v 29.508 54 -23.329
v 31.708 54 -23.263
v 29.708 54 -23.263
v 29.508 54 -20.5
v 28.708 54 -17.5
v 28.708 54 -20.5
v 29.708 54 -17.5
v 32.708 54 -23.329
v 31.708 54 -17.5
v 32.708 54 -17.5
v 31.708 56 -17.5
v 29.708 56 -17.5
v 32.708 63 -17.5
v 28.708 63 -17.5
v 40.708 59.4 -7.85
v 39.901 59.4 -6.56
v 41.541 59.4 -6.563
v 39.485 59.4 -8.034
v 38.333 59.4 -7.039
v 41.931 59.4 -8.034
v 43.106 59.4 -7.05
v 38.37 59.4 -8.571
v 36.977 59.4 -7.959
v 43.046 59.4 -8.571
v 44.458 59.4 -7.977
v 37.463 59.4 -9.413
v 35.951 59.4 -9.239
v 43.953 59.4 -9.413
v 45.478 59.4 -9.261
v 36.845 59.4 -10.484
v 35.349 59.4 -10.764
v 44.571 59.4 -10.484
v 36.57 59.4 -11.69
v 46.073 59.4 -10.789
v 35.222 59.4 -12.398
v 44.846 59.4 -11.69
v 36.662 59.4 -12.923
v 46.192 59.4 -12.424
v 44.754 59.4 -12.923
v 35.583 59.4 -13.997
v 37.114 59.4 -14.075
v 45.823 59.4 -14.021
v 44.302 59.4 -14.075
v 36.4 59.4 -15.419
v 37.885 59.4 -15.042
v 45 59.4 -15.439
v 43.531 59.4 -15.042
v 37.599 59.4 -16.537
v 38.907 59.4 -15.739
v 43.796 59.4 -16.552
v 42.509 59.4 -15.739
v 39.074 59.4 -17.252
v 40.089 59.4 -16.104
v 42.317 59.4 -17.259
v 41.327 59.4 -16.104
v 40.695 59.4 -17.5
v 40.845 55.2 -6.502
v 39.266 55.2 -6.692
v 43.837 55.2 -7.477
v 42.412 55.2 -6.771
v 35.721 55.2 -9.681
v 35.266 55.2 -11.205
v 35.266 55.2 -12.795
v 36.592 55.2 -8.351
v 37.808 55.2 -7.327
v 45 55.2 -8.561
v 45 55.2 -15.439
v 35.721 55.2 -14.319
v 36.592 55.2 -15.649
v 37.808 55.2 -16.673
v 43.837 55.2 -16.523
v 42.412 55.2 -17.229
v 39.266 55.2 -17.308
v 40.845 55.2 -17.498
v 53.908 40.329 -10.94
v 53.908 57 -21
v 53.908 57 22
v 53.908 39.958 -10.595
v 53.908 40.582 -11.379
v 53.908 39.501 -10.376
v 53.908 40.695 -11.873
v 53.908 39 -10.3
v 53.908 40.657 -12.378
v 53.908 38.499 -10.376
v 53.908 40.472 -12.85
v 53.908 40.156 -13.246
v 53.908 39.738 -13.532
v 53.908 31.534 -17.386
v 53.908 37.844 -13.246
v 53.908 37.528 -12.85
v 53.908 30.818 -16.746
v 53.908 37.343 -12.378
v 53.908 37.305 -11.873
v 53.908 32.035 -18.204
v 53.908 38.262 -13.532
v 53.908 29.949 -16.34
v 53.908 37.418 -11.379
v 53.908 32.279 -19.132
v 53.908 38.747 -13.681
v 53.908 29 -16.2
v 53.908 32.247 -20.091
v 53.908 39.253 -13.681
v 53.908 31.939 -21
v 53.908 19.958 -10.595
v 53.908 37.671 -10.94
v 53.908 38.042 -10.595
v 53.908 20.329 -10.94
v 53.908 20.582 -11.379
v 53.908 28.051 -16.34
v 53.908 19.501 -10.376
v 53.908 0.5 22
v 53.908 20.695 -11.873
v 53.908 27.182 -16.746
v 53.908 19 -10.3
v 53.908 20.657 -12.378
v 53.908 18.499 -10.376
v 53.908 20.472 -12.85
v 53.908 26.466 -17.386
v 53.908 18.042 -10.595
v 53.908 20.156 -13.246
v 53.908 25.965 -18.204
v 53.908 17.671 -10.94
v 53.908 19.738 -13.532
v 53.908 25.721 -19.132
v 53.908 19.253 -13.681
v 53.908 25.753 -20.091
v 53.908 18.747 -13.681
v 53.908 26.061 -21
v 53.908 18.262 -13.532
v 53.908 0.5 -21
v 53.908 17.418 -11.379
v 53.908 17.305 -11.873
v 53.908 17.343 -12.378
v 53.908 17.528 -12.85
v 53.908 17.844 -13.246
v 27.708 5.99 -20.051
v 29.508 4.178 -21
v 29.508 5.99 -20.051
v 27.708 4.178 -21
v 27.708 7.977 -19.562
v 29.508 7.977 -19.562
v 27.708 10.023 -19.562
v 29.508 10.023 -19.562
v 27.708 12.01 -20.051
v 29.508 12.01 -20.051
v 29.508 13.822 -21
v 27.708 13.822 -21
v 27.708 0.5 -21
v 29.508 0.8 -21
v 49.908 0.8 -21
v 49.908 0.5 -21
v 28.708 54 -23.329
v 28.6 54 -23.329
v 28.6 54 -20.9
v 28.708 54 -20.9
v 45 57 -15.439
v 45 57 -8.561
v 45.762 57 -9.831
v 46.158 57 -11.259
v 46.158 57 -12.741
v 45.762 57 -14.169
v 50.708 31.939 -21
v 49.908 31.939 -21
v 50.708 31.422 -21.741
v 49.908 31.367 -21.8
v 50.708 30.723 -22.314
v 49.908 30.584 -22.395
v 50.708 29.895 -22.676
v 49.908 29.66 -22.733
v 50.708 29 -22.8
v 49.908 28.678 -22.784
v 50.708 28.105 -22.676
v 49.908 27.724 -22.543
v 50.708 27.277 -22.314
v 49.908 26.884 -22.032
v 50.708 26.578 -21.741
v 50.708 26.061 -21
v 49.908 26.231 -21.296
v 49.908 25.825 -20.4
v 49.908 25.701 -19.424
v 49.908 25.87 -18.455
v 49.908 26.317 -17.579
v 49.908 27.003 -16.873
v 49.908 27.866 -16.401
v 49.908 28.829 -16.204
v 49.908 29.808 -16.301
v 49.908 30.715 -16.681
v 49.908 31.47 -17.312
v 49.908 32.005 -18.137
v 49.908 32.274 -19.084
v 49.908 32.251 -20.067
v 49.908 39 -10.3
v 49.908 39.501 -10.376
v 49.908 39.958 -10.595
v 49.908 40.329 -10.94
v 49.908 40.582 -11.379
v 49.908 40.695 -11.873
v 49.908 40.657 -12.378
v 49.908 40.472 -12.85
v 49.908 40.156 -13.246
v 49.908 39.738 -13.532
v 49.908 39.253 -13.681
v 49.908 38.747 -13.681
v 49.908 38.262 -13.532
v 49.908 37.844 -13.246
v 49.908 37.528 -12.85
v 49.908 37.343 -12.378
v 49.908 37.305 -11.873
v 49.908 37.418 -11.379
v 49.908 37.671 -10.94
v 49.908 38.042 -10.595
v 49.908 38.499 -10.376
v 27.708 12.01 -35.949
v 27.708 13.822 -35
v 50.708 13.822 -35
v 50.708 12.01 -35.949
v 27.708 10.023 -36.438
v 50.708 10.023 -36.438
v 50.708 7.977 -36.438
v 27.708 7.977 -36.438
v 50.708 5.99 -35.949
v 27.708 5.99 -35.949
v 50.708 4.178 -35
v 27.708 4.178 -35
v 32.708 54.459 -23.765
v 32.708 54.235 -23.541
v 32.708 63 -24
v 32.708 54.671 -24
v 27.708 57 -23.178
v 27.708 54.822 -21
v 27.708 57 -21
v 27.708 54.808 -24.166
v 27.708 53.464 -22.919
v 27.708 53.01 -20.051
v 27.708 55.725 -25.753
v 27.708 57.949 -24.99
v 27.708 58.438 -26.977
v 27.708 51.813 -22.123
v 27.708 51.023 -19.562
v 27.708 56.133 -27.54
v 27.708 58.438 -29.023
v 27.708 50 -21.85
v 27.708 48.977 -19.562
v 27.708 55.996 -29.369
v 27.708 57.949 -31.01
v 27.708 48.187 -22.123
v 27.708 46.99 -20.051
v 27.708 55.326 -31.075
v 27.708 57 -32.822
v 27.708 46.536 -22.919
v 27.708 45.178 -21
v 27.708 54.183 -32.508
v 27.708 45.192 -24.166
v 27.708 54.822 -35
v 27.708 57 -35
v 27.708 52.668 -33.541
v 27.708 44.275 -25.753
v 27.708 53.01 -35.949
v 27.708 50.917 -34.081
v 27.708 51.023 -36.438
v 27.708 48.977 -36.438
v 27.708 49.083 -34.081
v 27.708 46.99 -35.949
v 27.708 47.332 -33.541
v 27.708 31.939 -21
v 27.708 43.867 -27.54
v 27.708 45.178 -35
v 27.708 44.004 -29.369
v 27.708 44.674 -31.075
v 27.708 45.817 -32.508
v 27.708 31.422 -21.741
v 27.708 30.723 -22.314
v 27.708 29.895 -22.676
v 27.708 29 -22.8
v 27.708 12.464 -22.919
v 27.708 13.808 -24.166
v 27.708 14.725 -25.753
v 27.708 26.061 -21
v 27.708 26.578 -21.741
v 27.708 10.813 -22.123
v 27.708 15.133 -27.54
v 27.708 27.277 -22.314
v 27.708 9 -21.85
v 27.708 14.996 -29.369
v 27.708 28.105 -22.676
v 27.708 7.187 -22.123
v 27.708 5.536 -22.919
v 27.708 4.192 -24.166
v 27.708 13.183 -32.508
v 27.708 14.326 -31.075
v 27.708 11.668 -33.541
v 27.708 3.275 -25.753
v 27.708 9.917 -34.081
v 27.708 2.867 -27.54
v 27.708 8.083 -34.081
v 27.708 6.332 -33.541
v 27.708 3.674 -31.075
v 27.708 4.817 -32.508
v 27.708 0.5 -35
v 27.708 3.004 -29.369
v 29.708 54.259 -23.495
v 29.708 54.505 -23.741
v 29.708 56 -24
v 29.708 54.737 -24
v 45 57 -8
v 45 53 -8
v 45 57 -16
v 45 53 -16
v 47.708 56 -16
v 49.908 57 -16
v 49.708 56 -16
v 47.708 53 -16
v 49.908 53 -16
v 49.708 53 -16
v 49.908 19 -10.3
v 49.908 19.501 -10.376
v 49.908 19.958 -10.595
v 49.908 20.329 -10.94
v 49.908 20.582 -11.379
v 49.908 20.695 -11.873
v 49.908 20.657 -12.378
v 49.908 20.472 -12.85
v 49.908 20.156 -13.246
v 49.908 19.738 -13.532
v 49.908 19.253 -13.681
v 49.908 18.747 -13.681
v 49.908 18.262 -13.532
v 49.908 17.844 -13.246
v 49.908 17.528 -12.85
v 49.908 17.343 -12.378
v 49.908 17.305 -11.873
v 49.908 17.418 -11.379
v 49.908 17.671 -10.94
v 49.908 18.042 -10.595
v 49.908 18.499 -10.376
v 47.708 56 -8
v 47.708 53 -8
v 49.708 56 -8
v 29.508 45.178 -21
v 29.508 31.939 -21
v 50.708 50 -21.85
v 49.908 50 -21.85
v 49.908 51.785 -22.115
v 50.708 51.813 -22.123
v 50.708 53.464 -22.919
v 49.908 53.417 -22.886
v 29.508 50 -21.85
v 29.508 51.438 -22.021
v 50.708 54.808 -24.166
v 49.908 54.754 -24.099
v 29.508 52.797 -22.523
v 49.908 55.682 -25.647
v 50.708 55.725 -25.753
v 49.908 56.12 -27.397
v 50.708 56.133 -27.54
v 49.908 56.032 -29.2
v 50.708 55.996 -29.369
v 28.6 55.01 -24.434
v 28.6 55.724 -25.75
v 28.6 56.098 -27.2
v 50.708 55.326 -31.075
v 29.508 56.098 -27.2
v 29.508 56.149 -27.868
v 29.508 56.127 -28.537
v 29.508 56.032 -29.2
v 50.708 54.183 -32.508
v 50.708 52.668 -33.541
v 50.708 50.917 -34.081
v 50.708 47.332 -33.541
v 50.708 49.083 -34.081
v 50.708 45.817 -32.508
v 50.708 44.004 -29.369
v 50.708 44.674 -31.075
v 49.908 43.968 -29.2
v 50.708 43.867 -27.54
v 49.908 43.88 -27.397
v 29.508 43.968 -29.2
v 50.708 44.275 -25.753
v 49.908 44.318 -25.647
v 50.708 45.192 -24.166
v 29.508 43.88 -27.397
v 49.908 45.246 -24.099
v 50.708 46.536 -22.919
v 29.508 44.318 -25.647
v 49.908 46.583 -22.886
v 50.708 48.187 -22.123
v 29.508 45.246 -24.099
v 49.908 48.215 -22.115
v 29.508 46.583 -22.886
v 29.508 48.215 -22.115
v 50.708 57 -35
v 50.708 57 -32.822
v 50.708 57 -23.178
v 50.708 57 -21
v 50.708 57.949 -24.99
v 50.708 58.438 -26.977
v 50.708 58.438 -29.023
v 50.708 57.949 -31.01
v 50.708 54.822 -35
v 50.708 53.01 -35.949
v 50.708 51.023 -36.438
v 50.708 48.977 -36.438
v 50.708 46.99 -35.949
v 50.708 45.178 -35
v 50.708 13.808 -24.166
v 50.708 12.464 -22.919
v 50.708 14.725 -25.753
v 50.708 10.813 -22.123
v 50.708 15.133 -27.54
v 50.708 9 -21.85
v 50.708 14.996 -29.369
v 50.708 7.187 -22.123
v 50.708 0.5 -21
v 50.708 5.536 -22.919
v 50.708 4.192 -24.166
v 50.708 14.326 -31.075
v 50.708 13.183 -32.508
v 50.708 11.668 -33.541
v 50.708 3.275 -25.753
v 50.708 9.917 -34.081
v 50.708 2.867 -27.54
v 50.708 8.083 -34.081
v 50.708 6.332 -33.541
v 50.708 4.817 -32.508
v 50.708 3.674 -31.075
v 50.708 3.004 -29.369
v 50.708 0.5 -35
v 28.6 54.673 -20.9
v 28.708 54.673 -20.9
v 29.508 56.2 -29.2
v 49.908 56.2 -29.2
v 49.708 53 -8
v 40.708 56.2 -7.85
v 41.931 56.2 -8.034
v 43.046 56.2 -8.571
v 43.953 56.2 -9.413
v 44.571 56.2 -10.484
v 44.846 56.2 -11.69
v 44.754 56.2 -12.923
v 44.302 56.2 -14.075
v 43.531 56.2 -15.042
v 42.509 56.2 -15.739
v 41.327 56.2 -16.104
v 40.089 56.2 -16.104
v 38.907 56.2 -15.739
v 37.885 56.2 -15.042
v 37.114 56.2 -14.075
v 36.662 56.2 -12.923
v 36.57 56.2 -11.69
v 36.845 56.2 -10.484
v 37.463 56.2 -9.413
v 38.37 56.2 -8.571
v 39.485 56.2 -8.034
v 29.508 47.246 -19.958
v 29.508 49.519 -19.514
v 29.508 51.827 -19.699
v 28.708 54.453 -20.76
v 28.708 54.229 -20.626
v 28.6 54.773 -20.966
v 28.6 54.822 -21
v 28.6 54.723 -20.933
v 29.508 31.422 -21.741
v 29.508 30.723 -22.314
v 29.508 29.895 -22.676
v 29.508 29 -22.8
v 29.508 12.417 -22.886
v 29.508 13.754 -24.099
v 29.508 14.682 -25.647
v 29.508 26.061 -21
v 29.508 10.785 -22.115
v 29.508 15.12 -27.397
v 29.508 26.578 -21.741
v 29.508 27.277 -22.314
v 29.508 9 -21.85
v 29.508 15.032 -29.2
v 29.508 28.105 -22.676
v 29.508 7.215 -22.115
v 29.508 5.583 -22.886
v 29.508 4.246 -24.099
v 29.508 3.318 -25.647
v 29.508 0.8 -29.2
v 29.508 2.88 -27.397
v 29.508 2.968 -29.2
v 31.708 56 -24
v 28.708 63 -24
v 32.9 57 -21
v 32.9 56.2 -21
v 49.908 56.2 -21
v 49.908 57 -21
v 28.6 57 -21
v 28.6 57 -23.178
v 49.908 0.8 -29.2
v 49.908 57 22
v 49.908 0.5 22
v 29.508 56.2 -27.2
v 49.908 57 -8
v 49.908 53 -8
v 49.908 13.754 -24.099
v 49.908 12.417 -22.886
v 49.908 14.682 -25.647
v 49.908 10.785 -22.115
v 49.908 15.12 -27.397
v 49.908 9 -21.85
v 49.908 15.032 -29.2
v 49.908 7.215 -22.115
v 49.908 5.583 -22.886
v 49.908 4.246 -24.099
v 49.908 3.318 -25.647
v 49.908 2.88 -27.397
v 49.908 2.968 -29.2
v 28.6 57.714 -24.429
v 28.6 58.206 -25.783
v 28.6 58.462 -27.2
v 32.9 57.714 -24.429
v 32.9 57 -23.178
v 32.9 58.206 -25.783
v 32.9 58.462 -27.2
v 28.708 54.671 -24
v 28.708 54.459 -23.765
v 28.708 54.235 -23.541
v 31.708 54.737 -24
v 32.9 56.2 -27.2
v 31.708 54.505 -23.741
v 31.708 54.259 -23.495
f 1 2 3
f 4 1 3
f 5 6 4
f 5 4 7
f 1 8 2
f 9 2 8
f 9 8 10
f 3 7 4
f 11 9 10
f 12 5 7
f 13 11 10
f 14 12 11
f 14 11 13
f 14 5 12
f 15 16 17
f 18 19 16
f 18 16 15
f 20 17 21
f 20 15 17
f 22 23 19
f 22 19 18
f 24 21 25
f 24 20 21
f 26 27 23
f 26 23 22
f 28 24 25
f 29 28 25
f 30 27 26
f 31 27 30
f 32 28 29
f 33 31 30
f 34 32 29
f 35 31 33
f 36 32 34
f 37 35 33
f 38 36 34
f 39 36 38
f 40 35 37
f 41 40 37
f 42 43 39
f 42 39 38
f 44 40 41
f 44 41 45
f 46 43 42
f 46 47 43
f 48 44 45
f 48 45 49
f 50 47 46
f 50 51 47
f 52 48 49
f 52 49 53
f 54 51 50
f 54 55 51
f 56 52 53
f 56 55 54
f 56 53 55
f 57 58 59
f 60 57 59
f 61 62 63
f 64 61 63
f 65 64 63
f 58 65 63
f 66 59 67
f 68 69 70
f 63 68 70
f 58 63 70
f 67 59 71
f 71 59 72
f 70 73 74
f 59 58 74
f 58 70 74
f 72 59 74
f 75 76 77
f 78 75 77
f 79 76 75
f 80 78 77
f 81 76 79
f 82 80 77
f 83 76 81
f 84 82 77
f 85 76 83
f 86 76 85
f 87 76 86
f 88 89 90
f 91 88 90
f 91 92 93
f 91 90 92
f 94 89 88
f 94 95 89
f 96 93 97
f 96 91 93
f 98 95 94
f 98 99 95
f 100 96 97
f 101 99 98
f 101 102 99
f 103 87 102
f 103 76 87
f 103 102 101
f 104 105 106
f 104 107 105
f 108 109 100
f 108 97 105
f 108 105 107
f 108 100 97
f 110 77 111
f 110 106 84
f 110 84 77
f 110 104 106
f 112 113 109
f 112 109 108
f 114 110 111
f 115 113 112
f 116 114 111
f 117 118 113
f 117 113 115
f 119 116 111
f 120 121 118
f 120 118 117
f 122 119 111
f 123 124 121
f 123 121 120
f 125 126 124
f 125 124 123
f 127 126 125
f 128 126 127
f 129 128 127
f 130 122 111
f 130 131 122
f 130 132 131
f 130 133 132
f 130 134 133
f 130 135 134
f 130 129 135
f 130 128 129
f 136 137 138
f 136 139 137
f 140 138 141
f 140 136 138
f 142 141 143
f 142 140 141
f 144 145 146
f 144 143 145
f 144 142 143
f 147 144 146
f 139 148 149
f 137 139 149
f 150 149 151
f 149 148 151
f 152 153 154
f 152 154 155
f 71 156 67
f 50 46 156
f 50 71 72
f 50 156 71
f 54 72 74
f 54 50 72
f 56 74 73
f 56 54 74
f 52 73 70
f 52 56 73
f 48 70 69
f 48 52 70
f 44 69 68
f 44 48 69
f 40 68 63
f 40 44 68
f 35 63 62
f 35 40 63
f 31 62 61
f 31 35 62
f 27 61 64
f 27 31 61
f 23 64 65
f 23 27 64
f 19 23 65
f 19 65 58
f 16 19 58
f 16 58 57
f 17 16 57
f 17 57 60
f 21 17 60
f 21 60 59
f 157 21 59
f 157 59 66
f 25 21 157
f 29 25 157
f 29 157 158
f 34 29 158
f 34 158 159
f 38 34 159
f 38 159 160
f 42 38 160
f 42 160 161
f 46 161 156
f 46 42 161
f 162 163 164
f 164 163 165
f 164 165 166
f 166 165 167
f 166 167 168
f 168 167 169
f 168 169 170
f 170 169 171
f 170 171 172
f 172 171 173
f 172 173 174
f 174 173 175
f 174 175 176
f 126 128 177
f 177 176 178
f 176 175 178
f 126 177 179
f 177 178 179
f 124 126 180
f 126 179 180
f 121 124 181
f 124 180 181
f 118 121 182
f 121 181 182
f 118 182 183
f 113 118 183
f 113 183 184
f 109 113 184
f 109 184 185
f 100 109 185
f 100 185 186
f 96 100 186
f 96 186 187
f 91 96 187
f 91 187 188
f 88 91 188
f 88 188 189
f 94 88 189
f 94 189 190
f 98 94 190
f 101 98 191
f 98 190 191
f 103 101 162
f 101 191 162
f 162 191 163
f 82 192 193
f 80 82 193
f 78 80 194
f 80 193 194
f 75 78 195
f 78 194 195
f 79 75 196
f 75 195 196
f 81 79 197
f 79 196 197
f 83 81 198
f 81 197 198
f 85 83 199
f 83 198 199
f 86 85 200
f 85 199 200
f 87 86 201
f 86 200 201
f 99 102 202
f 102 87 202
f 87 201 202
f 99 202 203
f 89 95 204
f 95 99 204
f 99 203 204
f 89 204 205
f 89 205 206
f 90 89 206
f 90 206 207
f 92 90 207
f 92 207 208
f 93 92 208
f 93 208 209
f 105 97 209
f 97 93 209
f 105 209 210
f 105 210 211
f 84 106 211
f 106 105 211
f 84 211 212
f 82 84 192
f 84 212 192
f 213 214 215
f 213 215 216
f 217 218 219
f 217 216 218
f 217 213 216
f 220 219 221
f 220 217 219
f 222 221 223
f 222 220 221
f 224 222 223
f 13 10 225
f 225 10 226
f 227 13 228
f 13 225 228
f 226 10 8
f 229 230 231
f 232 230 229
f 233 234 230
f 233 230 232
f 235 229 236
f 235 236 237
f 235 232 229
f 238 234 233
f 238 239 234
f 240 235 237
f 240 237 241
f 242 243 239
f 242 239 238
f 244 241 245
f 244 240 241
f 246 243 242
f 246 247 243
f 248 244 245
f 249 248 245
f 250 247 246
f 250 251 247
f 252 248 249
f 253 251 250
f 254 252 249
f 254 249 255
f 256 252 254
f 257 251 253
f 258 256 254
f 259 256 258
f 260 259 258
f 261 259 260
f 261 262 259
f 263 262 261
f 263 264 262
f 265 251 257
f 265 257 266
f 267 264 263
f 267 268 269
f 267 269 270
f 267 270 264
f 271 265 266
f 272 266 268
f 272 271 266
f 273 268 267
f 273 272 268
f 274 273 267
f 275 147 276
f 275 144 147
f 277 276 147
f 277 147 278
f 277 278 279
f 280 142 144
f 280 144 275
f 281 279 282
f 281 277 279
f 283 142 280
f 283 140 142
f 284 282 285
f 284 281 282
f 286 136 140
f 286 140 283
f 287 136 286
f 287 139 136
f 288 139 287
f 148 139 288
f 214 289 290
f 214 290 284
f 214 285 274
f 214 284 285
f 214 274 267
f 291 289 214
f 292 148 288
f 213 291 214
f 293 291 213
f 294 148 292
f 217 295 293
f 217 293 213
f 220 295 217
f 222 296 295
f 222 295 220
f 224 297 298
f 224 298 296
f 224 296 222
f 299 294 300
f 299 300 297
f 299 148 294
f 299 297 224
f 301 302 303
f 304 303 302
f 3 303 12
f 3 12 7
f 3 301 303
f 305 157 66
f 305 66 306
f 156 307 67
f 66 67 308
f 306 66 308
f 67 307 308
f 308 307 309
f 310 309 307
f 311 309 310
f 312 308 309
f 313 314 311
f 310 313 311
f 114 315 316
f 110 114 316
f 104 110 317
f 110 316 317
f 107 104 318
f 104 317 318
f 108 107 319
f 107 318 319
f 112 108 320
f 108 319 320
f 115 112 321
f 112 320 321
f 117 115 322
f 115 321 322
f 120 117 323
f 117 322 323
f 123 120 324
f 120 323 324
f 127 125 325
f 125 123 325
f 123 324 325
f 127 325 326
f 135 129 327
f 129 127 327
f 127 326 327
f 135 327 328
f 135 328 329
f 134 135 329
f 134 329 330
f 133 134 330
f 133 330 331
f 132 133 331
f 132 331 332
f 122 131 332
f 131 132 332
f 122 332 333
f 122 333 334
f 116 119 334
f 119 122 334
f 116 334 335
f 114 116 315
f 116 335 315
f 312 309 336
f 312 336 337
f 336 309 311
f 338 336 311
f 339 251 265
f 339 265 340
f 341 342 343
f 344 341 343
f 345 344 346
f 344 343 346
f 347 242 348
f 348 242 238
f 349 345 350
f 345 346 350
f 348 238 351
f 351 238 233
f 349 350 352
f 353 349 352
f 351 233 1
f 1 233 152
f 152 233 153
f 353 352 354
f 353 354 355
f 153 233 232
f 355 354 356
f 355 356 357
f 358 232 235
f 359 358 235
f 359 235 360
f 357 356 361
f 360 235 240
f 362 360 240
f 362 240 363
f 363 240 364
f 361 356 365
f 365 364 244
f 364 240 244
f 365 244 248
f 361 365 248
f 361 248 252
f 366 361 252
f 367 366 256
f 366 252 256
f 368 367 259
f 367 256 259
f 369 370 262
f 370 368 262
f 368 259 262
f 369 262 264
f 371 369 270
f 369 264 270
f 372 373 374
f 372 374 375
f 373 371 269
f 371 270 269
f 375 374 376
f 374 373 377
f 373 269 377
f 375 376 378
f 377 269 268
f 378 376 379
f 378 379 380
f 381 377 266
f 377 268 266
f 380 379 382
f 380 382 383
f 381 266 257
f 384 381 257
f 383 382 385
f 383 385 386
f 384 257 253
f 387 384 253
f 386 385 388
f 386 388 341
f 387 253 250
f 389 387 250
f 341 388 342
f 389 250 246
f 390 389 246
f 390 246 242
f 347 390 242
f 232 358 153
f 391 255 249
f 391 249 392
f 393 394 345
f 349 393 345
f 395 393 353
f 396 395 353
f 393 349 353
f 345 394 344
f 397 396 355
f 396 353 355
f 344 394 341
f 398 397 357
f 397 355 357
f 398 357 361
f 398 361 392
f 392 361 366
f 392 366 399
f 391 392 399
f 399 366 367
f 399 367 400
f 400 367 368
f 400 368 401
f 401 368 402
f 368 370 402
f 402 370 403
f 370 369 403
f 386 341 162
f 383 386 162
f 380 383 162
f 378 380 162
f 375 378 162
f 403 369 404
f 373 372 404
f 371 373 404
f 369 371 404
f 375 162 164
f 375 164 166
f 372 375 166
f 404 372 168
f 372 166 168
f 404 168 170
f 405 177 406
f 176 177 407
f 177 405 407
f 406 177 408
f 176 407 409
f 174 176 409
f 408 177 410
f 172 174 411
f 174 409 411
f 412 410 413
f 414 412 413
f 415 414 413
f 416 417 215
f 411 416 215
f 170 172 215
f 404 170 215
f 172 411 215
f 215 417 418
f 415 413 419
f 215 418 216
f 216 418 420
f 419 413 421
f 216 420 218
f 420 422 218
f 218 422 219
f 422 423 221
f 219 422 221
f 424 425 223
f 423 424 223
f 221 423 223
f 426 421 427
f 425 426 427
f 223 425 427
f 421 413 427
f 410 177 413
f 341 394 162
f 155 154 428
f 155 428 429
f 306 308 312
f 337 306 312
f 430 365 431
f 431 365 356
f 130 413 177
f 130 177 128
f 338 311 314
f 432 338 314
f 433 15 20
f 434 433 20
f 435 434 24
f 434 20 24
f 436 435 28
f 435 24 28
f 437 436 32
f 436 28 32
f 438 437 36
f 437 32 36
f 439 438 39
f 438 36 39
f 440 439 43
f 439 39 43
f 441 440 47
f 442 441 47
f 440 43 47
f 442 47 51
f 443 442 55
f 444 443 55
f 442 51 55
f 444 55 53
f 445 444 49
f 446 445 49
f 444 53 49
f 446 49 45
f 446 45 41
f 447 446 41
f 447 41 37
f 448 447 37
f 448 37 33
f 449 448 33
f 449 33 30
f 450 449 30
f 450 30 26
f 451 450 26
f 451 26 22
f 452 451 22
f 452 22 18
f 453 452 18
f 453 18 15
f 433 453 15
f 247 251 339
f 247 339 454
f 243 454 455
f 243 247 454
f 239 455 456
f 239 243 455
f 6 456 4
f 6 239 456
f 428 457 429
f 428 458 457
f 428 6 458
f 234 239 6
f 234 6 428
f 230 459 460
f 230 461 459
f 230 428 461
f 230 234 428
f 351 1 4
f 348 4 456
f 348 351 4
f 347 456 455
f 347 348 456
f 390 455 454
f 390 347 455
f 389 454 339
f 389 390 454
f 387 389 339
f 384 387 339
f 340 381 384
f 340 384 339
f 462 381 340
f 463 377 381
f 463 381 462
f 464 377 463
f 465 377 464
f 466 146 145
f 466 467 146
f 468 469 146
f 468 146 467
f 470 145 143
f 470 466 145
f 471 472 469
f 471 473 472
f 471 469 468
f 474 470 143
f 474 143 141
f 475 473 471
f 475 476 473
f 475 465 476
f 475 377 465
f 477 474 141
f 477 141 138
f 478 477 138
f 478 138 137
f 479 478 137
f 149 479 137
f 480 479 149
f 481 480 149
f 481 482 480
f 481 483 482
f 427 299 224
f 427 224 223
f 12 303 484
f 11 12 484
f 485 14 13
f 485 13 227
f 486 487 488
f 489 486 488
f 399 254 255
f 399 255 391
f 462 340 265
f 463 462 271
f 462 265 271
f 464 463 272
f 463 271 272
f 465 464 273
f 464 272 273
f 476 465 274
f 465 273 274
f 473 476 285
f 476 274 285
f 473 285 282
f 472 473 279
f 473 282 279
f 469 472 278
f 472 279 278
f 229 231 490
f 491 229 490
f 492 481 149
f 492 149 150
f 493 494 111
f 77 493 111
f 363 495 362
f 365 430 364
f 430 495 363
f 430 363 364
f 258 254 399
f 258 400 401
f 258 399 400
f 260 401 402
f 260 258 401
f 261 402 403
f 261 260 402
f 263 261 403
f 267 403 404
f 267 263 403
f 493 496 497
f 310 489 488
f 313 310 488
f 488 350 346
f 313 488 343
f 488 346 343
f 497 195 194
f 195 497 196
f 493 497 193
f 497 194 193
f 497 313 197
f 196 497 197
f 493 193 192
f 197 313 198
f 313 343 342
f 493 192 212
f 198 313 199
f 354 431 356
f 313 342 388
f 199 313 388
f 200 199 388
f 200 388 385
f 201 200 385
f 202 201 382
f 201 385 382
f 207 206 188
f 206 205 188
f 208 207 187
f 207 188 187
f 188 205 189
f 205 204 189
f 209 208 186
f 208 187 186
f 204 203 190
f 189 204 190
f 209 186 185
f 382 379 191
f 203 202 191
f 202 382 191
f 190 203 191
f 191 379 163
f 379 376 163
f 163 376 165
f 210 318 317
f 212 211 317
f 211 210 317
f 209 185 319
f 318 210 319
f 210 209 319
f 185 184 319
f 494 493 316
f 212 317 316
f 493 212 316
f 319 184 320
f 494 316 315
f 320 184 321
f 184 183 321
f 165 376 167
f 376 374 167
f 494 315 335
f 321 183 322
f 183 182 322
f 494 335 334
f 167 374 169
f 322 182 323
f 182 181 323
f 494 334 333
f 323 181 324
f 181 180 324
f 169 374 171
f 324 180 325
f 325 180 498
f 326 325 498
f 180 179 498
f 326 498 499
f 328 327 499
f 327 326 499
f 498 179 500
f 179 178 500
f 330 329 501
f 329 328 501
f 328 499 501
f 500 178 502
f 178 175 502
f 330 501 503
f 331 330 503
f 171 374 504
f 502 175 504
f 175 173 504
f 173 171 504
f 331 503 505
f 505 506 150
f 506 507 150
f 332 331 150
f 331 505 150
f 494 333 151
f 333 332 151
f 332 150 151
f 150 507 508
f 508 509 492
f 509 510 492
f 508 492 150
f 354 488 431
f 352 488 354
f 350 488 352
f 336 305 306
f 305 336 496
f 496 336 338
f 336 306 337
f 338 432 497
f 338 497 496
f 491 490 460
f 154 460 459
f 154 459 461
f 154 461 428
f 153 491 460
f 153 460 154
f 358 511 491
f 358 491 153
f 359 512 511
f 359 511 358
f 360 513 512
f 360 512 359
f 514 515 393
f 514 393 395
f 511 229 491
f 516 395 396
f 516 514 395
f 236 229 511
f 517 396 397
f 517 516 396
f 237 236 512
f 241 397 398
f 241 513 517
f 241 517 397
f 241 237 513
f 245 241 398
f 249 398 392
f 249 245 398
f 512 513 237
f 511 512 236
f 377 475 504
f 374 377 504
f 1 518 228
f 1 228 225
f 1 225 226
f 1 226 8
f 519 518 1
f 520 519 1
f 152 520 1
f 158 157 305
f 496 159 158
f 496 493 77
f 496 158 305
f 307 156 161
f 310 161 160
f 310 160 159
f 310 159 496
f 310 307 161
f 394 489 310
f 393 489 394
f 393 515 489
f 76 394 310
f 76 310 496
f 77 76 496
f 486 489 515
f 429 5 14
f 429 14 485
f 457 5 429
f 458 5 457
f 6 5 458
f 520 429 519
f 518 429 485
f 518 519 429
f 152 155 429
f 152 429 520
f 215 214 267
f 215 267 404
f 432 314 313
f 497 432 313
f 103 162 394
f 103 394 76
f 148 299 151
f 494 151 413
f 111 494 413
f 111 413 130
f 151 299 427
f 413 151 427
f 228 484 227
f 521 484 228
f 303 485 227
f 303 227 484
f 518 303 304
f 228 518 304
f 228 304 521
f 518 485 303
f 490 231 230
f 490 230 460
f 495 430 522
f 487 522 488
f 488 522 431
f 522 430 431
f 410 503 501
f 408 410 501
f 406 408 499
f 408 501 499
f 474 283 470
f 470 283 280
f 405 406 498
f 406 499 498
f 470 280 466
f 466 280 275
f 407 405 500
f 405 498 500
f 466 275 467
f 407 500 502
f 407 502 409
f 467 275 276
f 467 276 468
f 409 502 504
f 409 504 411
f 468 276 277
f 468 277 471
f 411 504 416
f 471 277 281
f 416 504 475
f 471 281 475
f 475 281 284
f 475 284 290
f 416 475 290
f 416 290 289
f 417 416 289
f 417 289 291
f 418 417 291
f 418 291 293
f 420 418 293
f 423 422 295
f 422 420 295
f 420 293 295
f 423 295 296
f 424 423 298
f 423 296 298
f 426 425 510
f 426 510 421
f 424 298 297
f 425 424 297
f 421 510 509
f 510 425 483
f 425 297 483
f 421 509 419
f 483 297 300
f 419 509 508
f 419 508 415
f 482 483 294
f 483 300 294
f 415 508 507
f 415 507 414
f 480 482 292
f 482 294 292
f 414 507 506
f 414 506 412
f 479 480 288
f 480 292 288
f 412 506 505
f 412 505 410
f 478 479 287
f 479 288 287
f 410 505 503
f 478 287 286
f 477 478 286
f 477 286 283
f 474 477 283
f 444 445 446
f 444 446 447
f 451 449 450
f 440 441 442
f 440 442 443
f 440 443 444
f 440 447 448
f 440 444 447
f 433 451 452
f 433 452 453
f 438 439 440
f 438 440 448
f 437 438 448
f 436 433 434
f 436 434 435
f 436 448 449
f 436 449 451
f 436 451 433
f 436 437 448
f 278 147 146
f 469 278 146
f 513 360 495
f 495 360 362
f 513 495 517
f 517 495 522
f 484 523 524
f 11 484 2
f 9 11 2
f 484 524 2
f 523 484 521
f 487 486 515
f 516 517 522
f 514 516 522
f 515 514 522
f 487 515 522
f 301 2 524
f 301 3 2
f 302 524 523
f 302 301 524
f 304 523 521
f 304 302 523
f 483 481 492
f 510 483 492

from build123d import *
from build123d.topology import SkipClean

# Parameters (mm, degrees)
GUIDE_CARRIER_BODY_SKETCH_W                    = 23
GUIDE_CARRIER_BODY_SKETCH_H                    = 56.5
GUIDE_CARRIER_BODY_DEPTH                       = 14
REAR_CLAMP_WALL_SKETCH_W                       = 4
REAR_CLAMP_WALL_SKETCH_H                       = 56.5
REAR_CLAMP_WALL_DEPTH                          = 43
GUIDE_BUSH_BOSS_1_SKETCH_R                     = 8.5
GUIDE_BUSH_BOSS_1_DEPTH                        = 23
GUIDE_BUSH_BOSS_2_SKETCH_R                     = 8.5
GUIDE_BUSH_BOSS_2_DEPTH                        = 23
STEEL_TUBE_CAVITY_SKETCH_W                     = 20.4
STEEL_TUBE_CAVITY_SKETCH_H                     = 55.4
STEEL_TUBE_CAVITY_DEPTH                        = 40.4
GUIDE_BUSH_BORE_1_SKETCH_R                     = 6.15
GUIDE_BUSH_BORE_1_DEPTH                        = 23.3
GUIDE_BUSH_BORE_2_SKETCH_R                     = 6.15
GUIDE_BUSH_BORE_2_DEPTH                        = 23.3
CLAMP_BOLT_CLEARANCE_1_SKETCH_R                = 1.7
CLAMP_BOLT_CLEARANCE_1_DEPTH                   = 4.3
CLAMP_BOLT_CLEARANCE_2_SKETCH_R                = 1.7
CLAMP_BOLT_CLEARANCE_2_DEPTH                   = 4.3
TRAVEL_FLAG_ROOT_SKETCH_W                      = 4
TRAVEL_FLAG_ROOT_SKETCH_H                      = 5
TRAVEL_FLAG_ROOT_DEPTH                         = 6
MAGNET_HOLDER_BRIDGE_SKETCH_W                  = 8.908
MAGNET_HOLDER_BRIDGE_SKETCH_H                  = 4
MAGNET_HOLDER_BRIDGE_DEPTH                     = 8
MAGNET_HOLDER_BOSS_SKETCH_R                    = 5.5
MAGNET_HOLDER_BOSS_DEPTH                       = 4.2
MAGNET_SEATING_POCKET_SKETCH_R                 = 4.15
MAGNET_SEATING_POCKET_DEPTH                    = 3.3
STEEL_CORE_CLEARANCE_TOOL_STEEL_TUBE_2_W       = 20
STEEL_CORE_CLEARANCE_TOOL_STEEL_TUBE_2_H       = 55
STEEL_CORE_CLEARANCE_TOOL_STEEL_TUBE_STO_DEPTH = 40
STEEL_CORE_CLEARANCE_TOOL_TUBE_INTER_2_W       = 16
STEEL_CORE_CLEARANCE_TOOL_TUBE_INTER_2_H       = 55.2
STEEL_CORE_CLEARANCE_TOOL_TUBE_INTERIOR_DEPTH  = 36
STEEL_CORE_CLEARANCE_TOOL_GUIDE_BUSH_2_R       = 6.2
STEEL_CORE_CLEARANCE_TOOL_GUIDE_BUSH_CLE_DEPTH = 20.3
STEEL_CORE_CLEARANCE_TOOL_GUIDE_BUSH_4_R       = 6.2
STEEL_CORE_CLEARANCE_TOOL_GUIDE_BUSH_3_DEPTH   = 20.3
STEEL_CORE_CLEARANCE_TOOL_SCREW_THRO_2_R       = 3.3
STEEL_CORE_CLEARANCE_TOOL_SCREW_THROUGH_DEPTH  = 20.3
STEEL_CORE_CLEARANCE_TOOL_SPRING_PIN_2_R       = 1.7
STEEL_CORE_CLEARANCE_TOOL_SPRING_PIN_CLE_DEPTH = 2.2
STEEL_CORE_CLEARANCE_TOOL_SPRING_PIN_4_R       = 1.7
STEEL_CORE_CLEARANCE_TOOL_SPRING_PIN_3_DEPTH   = 2.2
STEEL_CORE_CLEARANCE_TOOL_SPRING_PIN_6_R       = 1.7
STEEL_CORE_CLEARANCE_TOOL_SPRING_PIN_5_DEPTH   = 2.2
STEEL_CORE_CLEARANCE_TOOL_CLAMP_BOLT_2_R       = 1.7
STEEL_CORE_CLEARANCE_TOOL_CLAMP_BOLT_CLE_DEPTH = 2.3
STEEL_CORE_CLEARANCE_TOOL_CLAMP_BOLT_4_R       = 1.7
STEEL_CORE_CLEARANCE_TOOL_CLAMP_BOLT_3_DEPTH   = 2.3
SCREW_FULL_TRAVEL_CLEARANCE_SKETCH_R           = 3.3
SCREW_FULL_TRAVEL_CLEARANCE_DEPTH              = 26.7
TRAVEL_FLAG_RELIEF_SKETCH_W                    = 4.3
TRAVEL_FLAG_RELIEF_SKETCH_H                    = 5.2
TRAVEL_FLAG_RELIEF_DEPTH                       = 6.3
CLEARANCED_TRAVEL_STOP_FLAG_DEPTH              = 4
FINAL_CORE_CLEARANCE_TOOL_STEEL_TUBE_2_W       = 20
FINAL_CORE_CLEARANCE_TOOL_STEEL_TUBE_2_H       = 55
FINAL_CORE_CLEARANCE_TOOL_STEEL_TUBE_STO_DEPTH = 40
FINAL_CORE_CLEARANCE_TOOL_TUBE_INTER_2_W       = 16
FINAL_CORE_CLEARANCE_TOOL_TUBE_INTER_2_H       = 55.2
FINAL_CORE_CLEARANCE_TOOL_TUBE_INTERIOR_DEPTH  = 36
FINAL_CORE_CLEARANCE_TOOL_GUIDE_BUSH_2_R       = 6.2
FINAL_CORE_CLEARANCE_TOOL_GUIDE_BUSH_CLE_DEPTH = 20.3
FINAL_CORE_CLEARANCE_TOOL_GUIDE_BUSH_4_R       = 6.2
FINAL_CORE_CLEARANCE_TOOL_GUIDE_BUSH_3_DEPTH   = 20.3
FINAL_CORE_CLEARANCE_TOOL_SCREW_THRO_2_R       = 3.3
FINAL_CORE_CLEARANCE_TOOL_SCREW_THROUGH_DEPTH  = 20.3
FINAL_CORE_CLEARANCE_TOOL_SPRING_PIN_2_R       = 1.7
FINAL_CORE_CLEARANCE_TOOL_SPRING_PIN_CLE_DEPTH = 2.2
FINAL_CORE_CLEARANCE_TOOL_SPRING_PIN_4_R       = 1.7
FINAL_CORE_CLEARANCE_TOOL_SPRING_PIN_3_DEPTH   = 2.2
FINAL_CORE_CLEARANCE_TOOL_SPRING_PIN_6_R       = 1.7
FINAL_CORE_CLEARANCE_TOOL_SPRING_PIN_5_DEPTH   = 2.2
FINAL_CORE_CLEARANCE_TOOL_CLAMP_BOLT_2_R       = 1.7
FINAL_CORE_CLEARANCE_TOOL_CLAMP_BOLT_CLE_DEPTH = 2.3
FINAL_CORE_CLEARANCE_TOOL_CLAMP_BOLT_4_R       = 1.7
FINAL_CORE_CLEARANCE_TOOL_CLAMP_BOLT_3_DEPTH   = 2.3


with BuildPart() as part:
    # Guide carrier body sketch → Guide carrier body (new body)
    with BuildSketch(Plane.XY.offset(-35)):
        with Locations((39.208348754, -28.75)):
            Rectangle(GUIDE_CARRIER_BODY_SKETCH_W, GUIDE_CARRIER_BODY_SKETCH_H)
    extrude(amount=GUIDE_CARRIER_BODY_DEPTH)

    # Rear clamp wall sketch → Rear clamp wall (add)
    with BuildSketch(Plane.XY.offset(-21)):
        with Locations((51.908348754, -28.75)):
            Rectangle(REAR_CLAMP_WALL_SKETCH_W, REAR_CLAMP_WALL_SKETCH_H)
    extrude(amount=REAR_CLAMP_WALL_DEPTH)

    # Guide bush boss 1 sketch → Guide bush boss 1 (add)
    with BuildSketch(Plane(origin=(27.708348754, 0, 0), x_dir=(0, 0, -1), z_dir=(1, 0, 0))):
        with Locations((28, -9)):
            Circle(GUIDE_BUSH_BOSS_1_SKETCH_R)
    extrude(amount=GUIDE_BUSH_BOSS_1_DEPTH)

    # Guide bush boss 2 sketch → Guide bush boss 2 (add)
    with BuildSketch(Plane(origin=(27.708348754, 0, 0), x_dir=(0, 0, -1), z_dir=(1, 0, 0))):
        with Locations((28, -50)):
            Circle(GUIDE_BUSH_BOSS_2_SKETCH_R)
    extrude(amount=GUIDE_BUSH_BOSS_2_DEPTH)

    # Steel tube cavity sketch → Steel tube cavity (cut)
    with BuildSketch(Plane.XY.offset(-29.2)):
        with Locations((39.708348754, -28.5)):
            Rectangle(STEEL_TUBE_CAVITY_SKETCH_W, STEEL_TUBE_CAVITY_SKETCH_H)
    extrude(amount=STEEL_TUBE_CAVITY_DEPTH, mode=Mode.SUBTRACT)

    # Guide bush bore 1 sketch → Guide bush bore 1 (cut)
    with BuildSketch(Plane(origin=(27.6, 0, 0), x_dir=(0, 0, -1), z_dir=(1, 0, 0))):
        with Locations((28, -9)):
            Circle(GUIDE_BUSH_BORE_1_SKETCH_R)
    extrude(amount=GUIDE_BUSH_BORE_1_DEPTH, mode=Mode.SUBTRACT)

    # Guide bush bore 2 sketch → Guide bush bore 2 (cut)
    with BuildSketch(Plane(origin=(27.6, 0, 0), x_dir=(0, 0, -1), z_dir=(1, 0, 0))):
        with Locations((28, -50)):
            Circle(GUIDE_BUSH_BORE_2_SKETCH_R)
    extrude(amount=GUIDE_BUSH_BORE_2_DEPTH, mode=Mode.SUBTRACT)

    # Clamp bolt clearance 1 sketch → Clamp bolt clearance 1 (cut)
    with BuildSketch(Plane(origin=(49.8, 0, 0), x_dir=(0, 0, -1), z_dir=(1, 0, 0))):
        with Locations((12, -19)):
            Circle(CLAMP_BOLT_CLEARANCE_1_SKETCH_R)
    extrude(amount=CLAMP_BOLT_CLEARANCE_1_DEPTH, mode=Mode.SUBTRACT)

    # Clamp bolt clearance 2 sketch → Clamp bolt clearance 2 (cut)
    with BuildSketch(Plane(origin=(49.8, 0, 0), x_dir=(0, 0, -1), z_dir=(1, 0, 0))):
        with Locations((12, -39)):
            Circle(CLAMP_BOLT_CLEARANCE_2_SKETCH_R)
    extrude(amount=CLAMP_BOLT_CLEARANCE_2_DEPTH, mode=Mode.SUBTRACT)

    # Travel flag root sketch → Travel flag root (add)
    with BuildSketch(Plane.XY.offset(-27)):
        with Locations((30.708348754, -56.5)):
            Rectangle(TRAVEL_FLAG_ROOT_SKETCH_W, TRAVEL_FLAG_ROOT_SKETCH_H)
    extrude(amount=TRAVEL_FLAG_ROOT_DEPTH)

    # Magnet holder bridge sketch → Magnet holder bridge (add)
    with BuildSketch(Plane.XY.offset(-16)):
        with Locations((49.454, -55)):
            Rectangle(MAGNET_HOLDER_BRIDGE_SKETCH_W, MAGNET_HOLDER_BRIDGE_SKETCH_H)
    extrude(amount=MAGNET_HOLDER_BRIDGE_DEPTH)

    # Magnet holder boss sketch → Magnet holder boss (add)
    with BuildSketch(Plane(origin=(0, -59.4, 0), x_dir=(1, 0, 0), z_dir=(0, 1, 0))):
        with Locations((40.708, 12)):
            Circle(MAGNET_HOLDER_BOSS_SKETCH_R)
    extrude(amount=MAGNET_HOLDER_BOSS_DEPTH)

    # Magnet seating pocket sketch → Magnet seating pocket (cut)
    with BuildSketch(Plane(origin=(0, -59.5, 0), x_dir=(1, 0, 0), z_dir=(0, 1, 0))):
        with Locations((40.708, 12)):
            Circle(MAGNET_SEATING_POCKET_SKETCH_R)
    extrude(amount=MAGNET_SEATING_POCKET_DEPTH, mode=Mode.SUBTRACT)


with BuildPart() as body_2:
    # Steel core clearance tool Steel tube 2 → Steel core clearance tool Steel tube sto (new body)
    with BuildSketch(Plane.XY.offset(-29)):
        with Locations((39.708348754, -28.5)):
            Rectangle(STEEL_CORE_CLEARANCE_TOOL_STEEL_TUBE_2_W, STEEL_CORE_CLEARANCE_TOOL_STEEL_TUBE_2_H)
    extrude(amount=STEEL_CORE_CLEARANCE_TOOL_STEEL_TUBE_STO_DEPTH)

    # Steel core clearance tool Tube inter 2 → Steel core clearance tool Tube interior (cut)
    with BuildSketch(Plane.XY.offset(-27)):
        with Locations((39.708348754, -28.5)):
            Rectangle(STEEL_CORE_CLEARANCE_TOOL_TUBE_INTER_2_W, STEEL_CORE_CLEARANCE_TOOL_TUBE_INTER_2_H)
    extrude(amount=STEEL_CORE_CLEARANCE_TOOL_TUBE_INTERIOR_DEPTH, mode=Mode.SUBTRACT)

    # Steel core clearance tool Guide bush 2 → Steel core clearance tool Guide bush cle (cut)
    with BuildSketch(Plane(origin=(29.6, 0, 0), x_dir=(0, 0, -1), z_dir=(1, 0, 0))):
        with Locations((28, -9)):
            Circle(STEEL_CORE_CLEARANCE_TOOL_GUIDE_BUSH_2_R)
    extrude(amount=STEEL_CORE_CLEARANCE_TOOL_GUIDE_BUSH_CLE_DEPTH, mode=Mode.SUBTRACT)

    # Steel core clearance tool Guide bush 4 → Steel core clearance tool Guide bush 3 (cut)
    with BuildSketch(Plane(origin=(29.6, 0, 0), x_dir=(0, 0, -1), z_dir=(1, 0, 0))):
        with Locations((28, -50)):
            Circle(STEEL_CORE_CLEARANCE_TOOL_GUIDE_BUSH_4_R)
    extrude(amount=STEEL_CORE_CLEARANCE_TOOL_GUIDE_BUSH_3_DEPTH, mode=Mode.SUBTRACT)

    # Steel core clearance tool Screw thro 2 → Steel core clearance tool Screw through (cut)
    with BuildSketch(Plane(origin=(29.6, 0, 0), x_dir=(0, 0, -1), z_dir=(1, 0, 0))):
        with Locations((19.5, -29)):
            Circle(STEEL_CORE_CLEARANCE_TOOL_SCREW_THRO_2_R)
    extrude(amount=STEEL_CORE_CLEARANCE_TOOL_SCREW_THROUGH_DEPTH, mode=Mode.SUBTRACT)

    # Steel core clearance tool Spring pin 2 → Steel core clearance tool Spring pin cle (cut)
    with BuildSketch(Plane.XY.offset(8.9)):
        with Locations((35.708348754, -12)):
            Circle(STEEL_CORE_CLEARANCE_TOOL_SPRING_PIN_2_R)
    extrude(amount=STEEL_CORE_CLEARANCE_TOOL_SPRING_PIN_CLE_DEPTH, mode=Mode.SUBTRACT)

    # Steel core clearance tool Spring pin 4 → Steel core clearance tool Spring pin 3 (cut)
    with BuildSketch(Plane.XY.offset(8.9)):
        with Locations((35.708348754, -29)):
            Circle(STEEL_CORE_CLEARANCE_TOOL_SPRING_PIN_4_R)
    extrude(amount=STEEL_CORE_CLEARANCE_TOOL_SPRING_PIN_3_DEPTH, mode=Mode.SUBTRACT)

    # Steel core clearance tool Spring pin 6 → Steel core clearance tool Spring pin 5 (cut)
    with BuildSketch(Plane.XY.offset(8.9)):
        with Locations((35.708348754, -46)):
            Circle(STEEL_CORE_CLEARANCE_TOOL_SPRING_PIN_6_R)
    extrude(amount=STEEL_CORE_CLEARANCE_TOOL_SPRING_PIN_5_DEPTH, mode=Mode.SUBTRACT)

    # Steel core clearance tool Clamp bolt 2 → Steel core clearance tool Clamp bolt cle (cut)
    with BuildSketch(Plane(origin=(47.6, 0, 0), x_dir=(0, 0, -1), z_dir=(1, 0, 0))):
        with Locations((12, -19)):
            Circle(STEEL_CORE_CLEARANCE_TOOL_CLAMP_BOLT_2_R)
    extrude(amount=STEEL_CORE_CLEARANCE_TOOL_CLAMP_BOLT_CLE_DEPTH, mode=Mode.SUBTRACT)

    # Steel core clearance tool Clamp bolt 4 → Steel core clearance tool Clamp bolt 3 (cut)
    with BuildSketch(Plane(origin=(47.6, 0, 0), x_dir=(0, 0, -1), z_dir=(1, 0, 0))):
        with Locations((12, -39)):
            Circle(STEEL_CORE_CLEARANCE_TOOL_CLAMP_BOLT_4_R)
    extrude(amount=STEEL_CORE_CLEARANCE_TOOL_CLAMP_BOLT_3_DEPTH, mode=Mode.SUBTRACT)


with BuildPart() as part_1:
    add(part.part)

    # Combine1: cut body 2
    add(body_2.part, mode=Mode.SUBTRACT)

    # Screw full travel clearance sketch → Screw full travel clearance (cut)
    with BuildSketch(Plane(origin=(27.5, 0, 0), x_dir=(0, 0, -1), z_dir=(1, 0, 0))):
        with Locations((19.5, -29)):
            Circle(SCREW_FULL_TRAVEL_CLEARANCE_SKETCH_R)
    extrude(amount=SCREW_FULL_TRAVEL_CLEARANCE_DEPTH, mode=Mode.SUBTRACT)

    # Travel flag relief sketch → Travel flag relief (cut)
    with BuildSketch(Plane.XY.offset(-27.2)):
        with Locations((30.75, -56.6)):
            Rectangle(TRAVEL_FLAG_RELIEF_SKETCH_W, TRAVEL_FLAG_RELIEF_SKETCH_H)
    extrude(amount=TRAVEL_FLAG_RELIEF_DEPTH, mode=Mode.SUBTRACT)

    # Clearanced travel flag sketch → Clearanced travel stop flag (add)
    with SkipClean():  # the faces are left unmerged after this step: merging them gives an invalid solid
        with BuildSketch(Plane(origin=(28.708348754, 0, 0), x_dir=(0, 0, -1), z_dir=(1, 0, 0))):
            with BuildLine():
                Line((17.5, -63), (24, -63))
                Line((24, -63), (24, -54.671455876))
                ThreePointArc((24, -54.671455876), (23.651293296, -54.348706704), (23.328544124, -54))
                Line((23.328544124, -54), (17.5, -54))
                Line((17.5, -54), (17.5, -63))
            make_face()
        extrude(amount=CLEARANCED_TRAVEL_STOP_FLAG_DEPTH)


with BuildPart() as body_2_2:
    # Final core clearance tool Steel tube 2 → Final core clearance tool Steel tube sto (new body)
    with BuildSketch(Plane.XY.offset(-29)):
        with Locations((39.708348754, -28.5)):
            Rectangle(FINAL_CORE_CLEARANCE_TOOL_STEEL_TUBE_2_W, FINAL_CORE_CLEARANCE_TOOL_STEEL_TUBE_2_H)
    extrude(amount=FINAL_CORE_CLEARANCE_TOOL_STEEL_TUBE_STO_DEPTH)

    # Final core clearance tool Tube inter 2 → Final core clearance tool Tube interior (cut)
    with BuildSketch(Plane.XY.offset(-27)):
        with Locations((39.708348754, -28.5)):
            Rectangle(FINAL_CORE_CLEARANCE_TOOL_TUBE_INTER_2_W, FINAL_CORE_CLEARANCE_TOOL_TUBE_INTER_2_H)
    extrude(amount=FINAL_CORE_CLEARANCE_TOOL_TUBE_INTERIOR_DEPTH, mode=Mode.SUBTRACT)

    # Final core clearance tool Guide bush 2 → Final core clearance tool Guide bush cle (cut)
    with BuildSketch(Plane(origin=(29.6, 0, 0), x_dir=(0, 0, -1), z_dir=(1, 0, 0))):
        with Locations((28, -9)):
            Circle(FINAL_CORE_CLEARANCE_TOOL_GUIDE_BUSH_2_R)
    extrude(amount=FINAL_CORE_CLEARANCE_TOOL_GUIDE_BUSH_CLE_DEPTH, mode=Mode.SUBTRACT)

    # Final core clearance tool Guide bush 4 → Final core clearance tool Guide bush 3 (cut)
    with BuildSketch(Plane(origin=(29.6, 0, 0), x_dir=(0, 0, -1), z_dir=(1, 0, 0))):
        with Locations((28, -50)):
            Circle(FINAL_CORE_CLEARANCE_TOOL_GUIDE_BUSH_4_R)
    extrude(amount=FINAL_CORE_CLEARANCE_TOOL_GUIDE_BUSH_3_DEPTH, mode=Mode.SUBTRACT)

    # Final core clearance tool Screw thro 2 → Final core clearance tool Screw through (cut)
    with BuildSketch(Plane(origin=(29.6, 0, 0), x_dir=(0, 0, -1), z_dir=(1, 0, 0))):
        with Locations((19.5, -29)):
            Circle(FINAL_CORE_CLEARANCE_TOOL_SCREW_THRO_2_R)
    extrude(amount=FINAL_CORE_CLEARANCE_TOOL_SCREW_THROUGH_DEPTH, mode=Mode.SUBTRACT)

    # Final core clearance tool Spring pin 2 → Final core clearance tool Spring pin cle (cut)
    with BuildSketch(Plane.XY.offset(8.9)):
        with Locations((35.708348754, -12)):
            Circle(FINAL_CORE_CLEARANCE_TOOL_SPRING_PIN_2_R)
    extrude(amount=FINAL_CORE_CLEARANCE_TOOL_SPRING_PIN_CLE_DEPTH, mode=Mode.SUBTRACT)

    # Final core clearance tool Spring pin 4 → Final core clearance tool Spring pin 3 (cut)
    with BuildSketch(Plane.XY.offset(8.9)):
        with Locations((35.708348754, -29)):
            Circle(FINAL_CORE_CLEARANCE_TOOL_SPRING_PIN_4_R)
    extrude(amount=FINAL_CORE_CLEARANCE_TOOL_SPRING_PIN_3_DEPTH, mode=Mode.SUBTRACT)

    # Final core clearance tool Spring pin 6 → Final core clearance tool Spring pin 5 (cut)
    with BuildSketch(Plane.XY.offset(8.9)):
        with Locations((35.708348754, -46)):
            Circle(FINAL_CORE_CLEARANCE_TOOL_SPRING_PIN_6_R)
    extrude(amount=FINAL_CORE_CLEARANCE_TOOL_SPRING_PIN_5_DEPTH, mode=Mode.SUBTRACT)

    # Final core clearance tool Clamp bolt 2 → Final core clearance tool Clamp bolt cle (cut)
    with BuildSketch(Plane(origin=(47.6, 0, 0), x_dir=(0, 0, -1), z_dir=(1, 0, 0))):
        with Locations((12, -19)):
            Circle(FINAL_CORE_CLEARANCE_TOOL_CLAMP_BOLT_2_R)
    extrude(amount=FINAL_CORE_CLEARANCE_TOOL_CLAMP_BOLT_CLE_DEPTH, mode=Mode.SUBTRACT)

    # Final core clearance tool Clamp bolt 4 → Final core clearance tool Clamp bolt 3 (cut)
    with BuildSketch(Plane(origin=(47.6, 0, 0), x_dir=(0, 0, -1), z_dir=(1, 0, 0))):
        with Locations((12, -39)):
            Circle(FINAL_CORE_CLEARANCE_TOOL_CLAMP_BOLT_4_R)
    extrude(amount=FINAL_CORE_CLEARANCE_TOOL_CLAMP_BOLT_3_DEPTH, mode=Mode.SUBTRACT)


with BuildPart() as part_2:
    add(part_1.part)

    # Combine2: cut body 2 2
    add(body_2_2.part, mode=Mode.SUBTRACT)


with BuildPart() as body_2_3:
    # Mirror1: mirrored copy
    add(part_2.part.mirror(Plane(origin=(0, 0, 0), x_dir=(0, 0, 1), z_dir=(0, -1, 0))))


solid = body_2_3.part
